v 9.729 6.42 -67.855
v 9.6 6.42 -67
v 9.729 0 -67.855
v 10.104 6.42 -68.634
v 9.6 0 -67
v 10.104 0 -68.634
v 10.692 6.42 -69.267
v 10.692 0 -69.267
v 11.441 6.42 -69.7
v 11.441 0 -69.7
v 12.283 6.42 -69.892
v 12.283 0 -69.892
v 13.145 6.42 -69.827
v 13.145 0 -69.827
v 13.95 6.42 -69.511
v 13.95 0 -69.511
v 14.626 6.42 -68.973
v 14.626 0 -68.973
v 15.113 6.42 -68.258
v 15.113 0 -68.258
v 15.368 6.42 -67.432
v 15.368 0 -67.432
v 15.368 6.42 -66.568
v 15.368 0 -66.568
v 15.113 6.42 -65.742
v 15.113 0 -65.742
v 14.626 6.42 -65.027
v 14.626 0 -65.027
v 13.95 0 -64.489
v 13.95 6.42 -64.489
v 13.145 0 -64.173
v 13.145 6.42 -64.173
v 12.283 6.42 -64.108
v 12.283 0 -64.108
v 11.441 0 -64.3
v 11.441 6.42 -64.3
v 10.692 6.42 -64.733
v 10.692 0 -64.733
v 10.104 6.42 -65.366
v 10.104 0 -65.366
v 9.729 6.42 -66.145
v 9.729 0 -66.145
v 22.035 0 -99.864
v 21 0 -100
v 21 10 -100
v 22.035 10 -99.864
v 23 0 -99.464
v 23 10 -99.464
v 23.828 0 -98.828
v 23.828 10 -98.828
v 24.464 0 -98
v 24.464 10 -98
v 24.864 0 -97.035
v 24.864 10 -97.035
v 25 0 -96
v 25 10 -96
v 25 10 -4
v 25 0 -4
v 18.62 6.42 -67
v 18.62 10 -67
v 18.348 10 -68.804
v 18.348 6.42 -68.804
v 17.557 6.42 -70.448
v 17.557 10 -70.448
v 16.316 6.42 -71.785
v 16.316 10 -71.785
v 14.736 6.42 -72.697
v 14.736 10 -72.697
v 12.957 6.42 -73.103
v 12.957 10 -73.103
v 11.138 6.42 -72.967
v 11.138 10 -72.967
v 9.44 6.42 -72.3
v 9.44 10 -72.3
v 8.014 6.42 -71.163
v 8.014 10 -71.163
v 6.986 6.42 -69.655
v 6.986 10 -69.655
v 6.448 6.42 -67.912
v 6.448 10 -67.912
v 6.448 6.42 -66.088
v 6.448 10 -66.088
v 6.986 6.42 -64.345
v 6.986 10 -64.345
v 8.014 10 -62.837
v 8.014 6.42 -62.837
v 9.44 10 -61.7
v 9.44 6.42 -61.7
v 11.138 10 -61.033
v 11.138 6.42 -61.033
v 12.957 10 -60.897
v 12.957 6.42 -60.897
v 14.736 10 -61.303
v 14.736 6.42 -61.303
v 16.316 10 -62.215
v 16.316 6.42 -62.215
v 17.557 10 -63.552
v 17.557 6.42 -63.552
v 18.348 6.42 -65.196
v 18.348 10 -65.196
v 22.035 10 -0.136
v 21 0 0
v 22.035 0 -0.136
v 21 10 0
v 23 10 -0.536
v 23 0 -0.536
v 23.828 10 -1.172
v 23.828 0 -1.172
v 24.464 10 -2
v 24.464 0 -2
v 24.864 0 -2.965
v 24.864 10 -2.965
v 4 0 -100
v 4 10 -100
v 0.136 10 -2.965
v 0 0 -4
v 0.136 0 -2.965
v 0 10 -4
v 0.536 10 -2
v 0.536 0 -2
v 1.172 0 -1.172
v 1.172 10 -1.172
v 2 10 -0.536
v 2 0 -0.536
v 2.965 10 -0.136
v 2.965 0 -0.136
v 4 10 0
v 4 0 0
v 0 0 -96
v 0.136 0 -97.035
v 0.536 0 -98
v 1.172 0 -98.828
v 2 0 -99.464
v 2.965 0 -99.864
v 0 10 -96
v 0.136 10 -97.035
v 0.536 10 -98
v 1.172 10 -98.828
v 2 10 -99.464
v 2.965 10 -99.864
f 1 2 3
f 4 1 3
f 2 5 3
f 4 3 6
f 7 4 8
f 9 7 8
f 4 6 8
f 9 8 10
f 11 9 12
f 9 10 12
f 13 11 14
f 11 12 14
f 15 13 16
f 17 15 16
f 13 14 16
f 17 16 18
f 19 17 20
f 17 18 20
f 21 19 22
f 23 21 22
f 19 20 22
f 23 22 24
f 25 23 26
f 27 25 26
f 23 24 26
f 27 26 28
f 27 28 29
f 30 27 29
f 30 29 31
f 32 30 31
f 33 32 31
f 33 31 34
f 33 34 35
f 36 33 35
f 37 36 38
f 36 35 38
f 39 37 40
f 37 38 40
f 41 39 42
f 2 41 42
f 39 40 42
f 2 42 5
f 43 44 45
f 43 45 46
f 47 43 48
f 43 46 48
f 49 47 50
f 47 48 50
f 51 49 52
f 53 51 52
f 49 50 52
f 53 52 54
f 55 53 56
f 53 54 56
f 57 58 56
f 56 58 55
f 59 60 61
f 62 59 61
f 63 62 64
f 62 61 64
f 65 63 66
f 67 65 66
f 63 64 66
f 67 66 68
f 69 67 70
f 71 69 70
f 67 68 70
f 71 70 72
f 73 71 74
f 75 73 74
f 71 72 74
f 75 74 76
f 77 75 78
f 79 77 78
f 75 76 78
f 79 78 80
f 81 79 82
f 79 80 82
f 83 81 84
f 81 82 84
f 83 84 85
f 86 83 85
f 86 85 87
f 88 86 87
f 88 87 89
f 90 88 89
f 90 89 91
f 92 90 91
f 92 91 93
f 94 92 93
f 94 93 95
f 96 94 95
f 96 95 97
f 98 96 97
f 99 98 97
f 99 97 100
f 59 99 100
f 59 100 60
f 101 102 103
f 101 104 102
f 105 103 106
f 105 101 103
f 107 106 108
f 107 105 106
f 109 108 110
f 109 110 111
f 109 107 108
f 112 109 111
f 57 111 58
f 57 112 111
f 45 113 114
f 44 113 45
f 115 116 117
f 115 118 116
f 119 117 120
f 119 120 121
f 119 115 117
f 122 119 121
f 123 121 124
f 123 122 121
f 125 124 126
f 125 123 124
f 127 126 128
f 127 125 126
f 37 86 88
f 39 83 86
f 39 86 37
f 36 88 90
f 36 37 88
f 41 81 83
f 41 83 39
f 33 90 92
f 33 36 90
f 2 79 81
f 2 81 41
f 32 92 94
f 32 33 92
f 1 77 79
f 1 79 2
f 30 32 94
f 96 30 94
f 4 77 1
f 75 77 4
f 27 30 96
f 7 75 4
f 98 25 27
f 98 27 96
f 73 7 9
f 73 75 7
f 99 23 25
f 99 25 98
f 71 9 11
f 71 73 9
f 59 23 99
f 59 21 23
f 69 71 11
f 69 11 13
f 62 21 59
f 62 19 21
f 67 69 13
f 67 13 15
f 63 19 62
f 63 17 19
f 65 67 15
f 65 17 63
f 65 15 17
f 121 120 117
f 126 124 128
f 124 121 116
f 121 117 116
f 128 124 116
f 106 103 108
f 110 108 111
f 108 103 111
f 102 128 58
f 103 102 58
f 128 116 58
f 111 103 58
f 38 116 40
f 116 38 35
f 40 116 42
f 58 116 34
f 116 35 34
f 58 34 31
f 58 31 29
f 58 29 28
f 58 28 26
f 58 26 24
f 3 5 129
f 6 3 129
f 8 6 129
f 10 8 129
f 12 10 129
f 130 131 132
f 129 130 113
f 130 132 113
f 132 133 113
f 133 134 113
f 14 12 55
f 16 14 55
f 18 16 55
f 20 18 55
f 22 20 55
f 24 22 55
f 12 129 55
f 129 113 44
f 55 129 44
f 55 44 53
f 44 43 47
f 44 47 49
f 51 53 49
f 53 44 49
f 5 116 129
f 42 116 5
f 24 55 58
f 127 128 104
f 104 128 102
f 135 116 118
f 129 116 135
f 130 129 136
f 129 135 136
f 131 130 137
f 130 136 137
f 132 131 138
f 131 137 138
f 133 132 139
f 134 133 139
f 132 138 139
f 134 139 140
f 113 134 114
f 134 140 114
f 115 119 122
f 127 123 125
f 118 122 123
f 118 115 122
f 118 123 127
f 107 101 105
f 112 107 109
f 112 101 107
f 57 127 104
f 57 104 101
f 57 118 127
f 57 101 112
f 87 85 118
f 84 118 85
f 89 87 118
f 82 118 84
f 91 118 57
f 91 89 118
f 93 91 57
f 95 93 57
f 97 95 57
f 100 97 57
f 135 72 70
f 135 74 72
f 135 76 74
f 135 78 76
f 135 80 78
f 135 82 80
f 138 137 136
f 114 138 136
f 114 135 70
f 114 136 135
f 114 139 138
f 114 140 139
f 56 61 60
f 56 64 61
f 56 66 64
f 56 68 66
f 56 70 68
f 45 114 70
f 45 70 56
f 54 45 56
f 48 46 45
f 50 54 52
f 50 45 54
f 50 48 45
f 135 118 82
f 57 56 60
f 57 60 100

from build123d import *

# Parameters (mm, degrees)
SKETCH1_W                               = 25
SKETCH1_H                               = 100
BOSS_EXTRUDE1_DEPTH                     = 10
CBORE_FOR_M5_HEX_HEAD_BOLT1_D           = 5.8
CBORE_FOR_M5_HEX_HEAD_BOLT1_CBORE_D     = 12.24
CBORE_FOR_M5_HEX_HEAD_BOLT1_CBORE_DEPTH = 3.58
FILLET1_R                               = 4


with BuildPart() as part:
    # Sketch1 → Boss-Extrude1 (new body)
    with BuildSketch(Plane(origin=(0, 0, 0), x_dir=(1, 0, 0), z_dir=(0, 1, 0))):
        with Locations((12.5, 50)):
            Rectangle(SKETCH1_W, SKETCH1_H)
    extrude(amount=BOSS_EXTRUDE1_DEPTH)

    # CBORE for M5 Hex Head Bolt1 (through all)
    with Locations(Plane(origin=(0, 10, 0), x_dir=(1, 0, 0), z_dir=(0, 1, 0))):
        with Locations((12.5, 67)):
            CounterBoreHole(CBORE_FOR_M5_HEX_HEAD_BOLT1_D / 2, CBORE_FOR_M5_HEX_HEAD_BOLT1_CBORE_D / 2, CBORE_FOR_M5_HEX_HEAD_BOLT1_CBORE_DEPTH)

    # Fillet1
    fillet1_edges = [part.edges().sort_by_distance(p)[0] for p in [
        (0, 5, -100),
        (25, 5, -100),
        (25, 5, 0),
        (0, 5, 0),
    ]]
    fillet(fillet1_edges, radius=FILLET1_R)


solid = part.part
